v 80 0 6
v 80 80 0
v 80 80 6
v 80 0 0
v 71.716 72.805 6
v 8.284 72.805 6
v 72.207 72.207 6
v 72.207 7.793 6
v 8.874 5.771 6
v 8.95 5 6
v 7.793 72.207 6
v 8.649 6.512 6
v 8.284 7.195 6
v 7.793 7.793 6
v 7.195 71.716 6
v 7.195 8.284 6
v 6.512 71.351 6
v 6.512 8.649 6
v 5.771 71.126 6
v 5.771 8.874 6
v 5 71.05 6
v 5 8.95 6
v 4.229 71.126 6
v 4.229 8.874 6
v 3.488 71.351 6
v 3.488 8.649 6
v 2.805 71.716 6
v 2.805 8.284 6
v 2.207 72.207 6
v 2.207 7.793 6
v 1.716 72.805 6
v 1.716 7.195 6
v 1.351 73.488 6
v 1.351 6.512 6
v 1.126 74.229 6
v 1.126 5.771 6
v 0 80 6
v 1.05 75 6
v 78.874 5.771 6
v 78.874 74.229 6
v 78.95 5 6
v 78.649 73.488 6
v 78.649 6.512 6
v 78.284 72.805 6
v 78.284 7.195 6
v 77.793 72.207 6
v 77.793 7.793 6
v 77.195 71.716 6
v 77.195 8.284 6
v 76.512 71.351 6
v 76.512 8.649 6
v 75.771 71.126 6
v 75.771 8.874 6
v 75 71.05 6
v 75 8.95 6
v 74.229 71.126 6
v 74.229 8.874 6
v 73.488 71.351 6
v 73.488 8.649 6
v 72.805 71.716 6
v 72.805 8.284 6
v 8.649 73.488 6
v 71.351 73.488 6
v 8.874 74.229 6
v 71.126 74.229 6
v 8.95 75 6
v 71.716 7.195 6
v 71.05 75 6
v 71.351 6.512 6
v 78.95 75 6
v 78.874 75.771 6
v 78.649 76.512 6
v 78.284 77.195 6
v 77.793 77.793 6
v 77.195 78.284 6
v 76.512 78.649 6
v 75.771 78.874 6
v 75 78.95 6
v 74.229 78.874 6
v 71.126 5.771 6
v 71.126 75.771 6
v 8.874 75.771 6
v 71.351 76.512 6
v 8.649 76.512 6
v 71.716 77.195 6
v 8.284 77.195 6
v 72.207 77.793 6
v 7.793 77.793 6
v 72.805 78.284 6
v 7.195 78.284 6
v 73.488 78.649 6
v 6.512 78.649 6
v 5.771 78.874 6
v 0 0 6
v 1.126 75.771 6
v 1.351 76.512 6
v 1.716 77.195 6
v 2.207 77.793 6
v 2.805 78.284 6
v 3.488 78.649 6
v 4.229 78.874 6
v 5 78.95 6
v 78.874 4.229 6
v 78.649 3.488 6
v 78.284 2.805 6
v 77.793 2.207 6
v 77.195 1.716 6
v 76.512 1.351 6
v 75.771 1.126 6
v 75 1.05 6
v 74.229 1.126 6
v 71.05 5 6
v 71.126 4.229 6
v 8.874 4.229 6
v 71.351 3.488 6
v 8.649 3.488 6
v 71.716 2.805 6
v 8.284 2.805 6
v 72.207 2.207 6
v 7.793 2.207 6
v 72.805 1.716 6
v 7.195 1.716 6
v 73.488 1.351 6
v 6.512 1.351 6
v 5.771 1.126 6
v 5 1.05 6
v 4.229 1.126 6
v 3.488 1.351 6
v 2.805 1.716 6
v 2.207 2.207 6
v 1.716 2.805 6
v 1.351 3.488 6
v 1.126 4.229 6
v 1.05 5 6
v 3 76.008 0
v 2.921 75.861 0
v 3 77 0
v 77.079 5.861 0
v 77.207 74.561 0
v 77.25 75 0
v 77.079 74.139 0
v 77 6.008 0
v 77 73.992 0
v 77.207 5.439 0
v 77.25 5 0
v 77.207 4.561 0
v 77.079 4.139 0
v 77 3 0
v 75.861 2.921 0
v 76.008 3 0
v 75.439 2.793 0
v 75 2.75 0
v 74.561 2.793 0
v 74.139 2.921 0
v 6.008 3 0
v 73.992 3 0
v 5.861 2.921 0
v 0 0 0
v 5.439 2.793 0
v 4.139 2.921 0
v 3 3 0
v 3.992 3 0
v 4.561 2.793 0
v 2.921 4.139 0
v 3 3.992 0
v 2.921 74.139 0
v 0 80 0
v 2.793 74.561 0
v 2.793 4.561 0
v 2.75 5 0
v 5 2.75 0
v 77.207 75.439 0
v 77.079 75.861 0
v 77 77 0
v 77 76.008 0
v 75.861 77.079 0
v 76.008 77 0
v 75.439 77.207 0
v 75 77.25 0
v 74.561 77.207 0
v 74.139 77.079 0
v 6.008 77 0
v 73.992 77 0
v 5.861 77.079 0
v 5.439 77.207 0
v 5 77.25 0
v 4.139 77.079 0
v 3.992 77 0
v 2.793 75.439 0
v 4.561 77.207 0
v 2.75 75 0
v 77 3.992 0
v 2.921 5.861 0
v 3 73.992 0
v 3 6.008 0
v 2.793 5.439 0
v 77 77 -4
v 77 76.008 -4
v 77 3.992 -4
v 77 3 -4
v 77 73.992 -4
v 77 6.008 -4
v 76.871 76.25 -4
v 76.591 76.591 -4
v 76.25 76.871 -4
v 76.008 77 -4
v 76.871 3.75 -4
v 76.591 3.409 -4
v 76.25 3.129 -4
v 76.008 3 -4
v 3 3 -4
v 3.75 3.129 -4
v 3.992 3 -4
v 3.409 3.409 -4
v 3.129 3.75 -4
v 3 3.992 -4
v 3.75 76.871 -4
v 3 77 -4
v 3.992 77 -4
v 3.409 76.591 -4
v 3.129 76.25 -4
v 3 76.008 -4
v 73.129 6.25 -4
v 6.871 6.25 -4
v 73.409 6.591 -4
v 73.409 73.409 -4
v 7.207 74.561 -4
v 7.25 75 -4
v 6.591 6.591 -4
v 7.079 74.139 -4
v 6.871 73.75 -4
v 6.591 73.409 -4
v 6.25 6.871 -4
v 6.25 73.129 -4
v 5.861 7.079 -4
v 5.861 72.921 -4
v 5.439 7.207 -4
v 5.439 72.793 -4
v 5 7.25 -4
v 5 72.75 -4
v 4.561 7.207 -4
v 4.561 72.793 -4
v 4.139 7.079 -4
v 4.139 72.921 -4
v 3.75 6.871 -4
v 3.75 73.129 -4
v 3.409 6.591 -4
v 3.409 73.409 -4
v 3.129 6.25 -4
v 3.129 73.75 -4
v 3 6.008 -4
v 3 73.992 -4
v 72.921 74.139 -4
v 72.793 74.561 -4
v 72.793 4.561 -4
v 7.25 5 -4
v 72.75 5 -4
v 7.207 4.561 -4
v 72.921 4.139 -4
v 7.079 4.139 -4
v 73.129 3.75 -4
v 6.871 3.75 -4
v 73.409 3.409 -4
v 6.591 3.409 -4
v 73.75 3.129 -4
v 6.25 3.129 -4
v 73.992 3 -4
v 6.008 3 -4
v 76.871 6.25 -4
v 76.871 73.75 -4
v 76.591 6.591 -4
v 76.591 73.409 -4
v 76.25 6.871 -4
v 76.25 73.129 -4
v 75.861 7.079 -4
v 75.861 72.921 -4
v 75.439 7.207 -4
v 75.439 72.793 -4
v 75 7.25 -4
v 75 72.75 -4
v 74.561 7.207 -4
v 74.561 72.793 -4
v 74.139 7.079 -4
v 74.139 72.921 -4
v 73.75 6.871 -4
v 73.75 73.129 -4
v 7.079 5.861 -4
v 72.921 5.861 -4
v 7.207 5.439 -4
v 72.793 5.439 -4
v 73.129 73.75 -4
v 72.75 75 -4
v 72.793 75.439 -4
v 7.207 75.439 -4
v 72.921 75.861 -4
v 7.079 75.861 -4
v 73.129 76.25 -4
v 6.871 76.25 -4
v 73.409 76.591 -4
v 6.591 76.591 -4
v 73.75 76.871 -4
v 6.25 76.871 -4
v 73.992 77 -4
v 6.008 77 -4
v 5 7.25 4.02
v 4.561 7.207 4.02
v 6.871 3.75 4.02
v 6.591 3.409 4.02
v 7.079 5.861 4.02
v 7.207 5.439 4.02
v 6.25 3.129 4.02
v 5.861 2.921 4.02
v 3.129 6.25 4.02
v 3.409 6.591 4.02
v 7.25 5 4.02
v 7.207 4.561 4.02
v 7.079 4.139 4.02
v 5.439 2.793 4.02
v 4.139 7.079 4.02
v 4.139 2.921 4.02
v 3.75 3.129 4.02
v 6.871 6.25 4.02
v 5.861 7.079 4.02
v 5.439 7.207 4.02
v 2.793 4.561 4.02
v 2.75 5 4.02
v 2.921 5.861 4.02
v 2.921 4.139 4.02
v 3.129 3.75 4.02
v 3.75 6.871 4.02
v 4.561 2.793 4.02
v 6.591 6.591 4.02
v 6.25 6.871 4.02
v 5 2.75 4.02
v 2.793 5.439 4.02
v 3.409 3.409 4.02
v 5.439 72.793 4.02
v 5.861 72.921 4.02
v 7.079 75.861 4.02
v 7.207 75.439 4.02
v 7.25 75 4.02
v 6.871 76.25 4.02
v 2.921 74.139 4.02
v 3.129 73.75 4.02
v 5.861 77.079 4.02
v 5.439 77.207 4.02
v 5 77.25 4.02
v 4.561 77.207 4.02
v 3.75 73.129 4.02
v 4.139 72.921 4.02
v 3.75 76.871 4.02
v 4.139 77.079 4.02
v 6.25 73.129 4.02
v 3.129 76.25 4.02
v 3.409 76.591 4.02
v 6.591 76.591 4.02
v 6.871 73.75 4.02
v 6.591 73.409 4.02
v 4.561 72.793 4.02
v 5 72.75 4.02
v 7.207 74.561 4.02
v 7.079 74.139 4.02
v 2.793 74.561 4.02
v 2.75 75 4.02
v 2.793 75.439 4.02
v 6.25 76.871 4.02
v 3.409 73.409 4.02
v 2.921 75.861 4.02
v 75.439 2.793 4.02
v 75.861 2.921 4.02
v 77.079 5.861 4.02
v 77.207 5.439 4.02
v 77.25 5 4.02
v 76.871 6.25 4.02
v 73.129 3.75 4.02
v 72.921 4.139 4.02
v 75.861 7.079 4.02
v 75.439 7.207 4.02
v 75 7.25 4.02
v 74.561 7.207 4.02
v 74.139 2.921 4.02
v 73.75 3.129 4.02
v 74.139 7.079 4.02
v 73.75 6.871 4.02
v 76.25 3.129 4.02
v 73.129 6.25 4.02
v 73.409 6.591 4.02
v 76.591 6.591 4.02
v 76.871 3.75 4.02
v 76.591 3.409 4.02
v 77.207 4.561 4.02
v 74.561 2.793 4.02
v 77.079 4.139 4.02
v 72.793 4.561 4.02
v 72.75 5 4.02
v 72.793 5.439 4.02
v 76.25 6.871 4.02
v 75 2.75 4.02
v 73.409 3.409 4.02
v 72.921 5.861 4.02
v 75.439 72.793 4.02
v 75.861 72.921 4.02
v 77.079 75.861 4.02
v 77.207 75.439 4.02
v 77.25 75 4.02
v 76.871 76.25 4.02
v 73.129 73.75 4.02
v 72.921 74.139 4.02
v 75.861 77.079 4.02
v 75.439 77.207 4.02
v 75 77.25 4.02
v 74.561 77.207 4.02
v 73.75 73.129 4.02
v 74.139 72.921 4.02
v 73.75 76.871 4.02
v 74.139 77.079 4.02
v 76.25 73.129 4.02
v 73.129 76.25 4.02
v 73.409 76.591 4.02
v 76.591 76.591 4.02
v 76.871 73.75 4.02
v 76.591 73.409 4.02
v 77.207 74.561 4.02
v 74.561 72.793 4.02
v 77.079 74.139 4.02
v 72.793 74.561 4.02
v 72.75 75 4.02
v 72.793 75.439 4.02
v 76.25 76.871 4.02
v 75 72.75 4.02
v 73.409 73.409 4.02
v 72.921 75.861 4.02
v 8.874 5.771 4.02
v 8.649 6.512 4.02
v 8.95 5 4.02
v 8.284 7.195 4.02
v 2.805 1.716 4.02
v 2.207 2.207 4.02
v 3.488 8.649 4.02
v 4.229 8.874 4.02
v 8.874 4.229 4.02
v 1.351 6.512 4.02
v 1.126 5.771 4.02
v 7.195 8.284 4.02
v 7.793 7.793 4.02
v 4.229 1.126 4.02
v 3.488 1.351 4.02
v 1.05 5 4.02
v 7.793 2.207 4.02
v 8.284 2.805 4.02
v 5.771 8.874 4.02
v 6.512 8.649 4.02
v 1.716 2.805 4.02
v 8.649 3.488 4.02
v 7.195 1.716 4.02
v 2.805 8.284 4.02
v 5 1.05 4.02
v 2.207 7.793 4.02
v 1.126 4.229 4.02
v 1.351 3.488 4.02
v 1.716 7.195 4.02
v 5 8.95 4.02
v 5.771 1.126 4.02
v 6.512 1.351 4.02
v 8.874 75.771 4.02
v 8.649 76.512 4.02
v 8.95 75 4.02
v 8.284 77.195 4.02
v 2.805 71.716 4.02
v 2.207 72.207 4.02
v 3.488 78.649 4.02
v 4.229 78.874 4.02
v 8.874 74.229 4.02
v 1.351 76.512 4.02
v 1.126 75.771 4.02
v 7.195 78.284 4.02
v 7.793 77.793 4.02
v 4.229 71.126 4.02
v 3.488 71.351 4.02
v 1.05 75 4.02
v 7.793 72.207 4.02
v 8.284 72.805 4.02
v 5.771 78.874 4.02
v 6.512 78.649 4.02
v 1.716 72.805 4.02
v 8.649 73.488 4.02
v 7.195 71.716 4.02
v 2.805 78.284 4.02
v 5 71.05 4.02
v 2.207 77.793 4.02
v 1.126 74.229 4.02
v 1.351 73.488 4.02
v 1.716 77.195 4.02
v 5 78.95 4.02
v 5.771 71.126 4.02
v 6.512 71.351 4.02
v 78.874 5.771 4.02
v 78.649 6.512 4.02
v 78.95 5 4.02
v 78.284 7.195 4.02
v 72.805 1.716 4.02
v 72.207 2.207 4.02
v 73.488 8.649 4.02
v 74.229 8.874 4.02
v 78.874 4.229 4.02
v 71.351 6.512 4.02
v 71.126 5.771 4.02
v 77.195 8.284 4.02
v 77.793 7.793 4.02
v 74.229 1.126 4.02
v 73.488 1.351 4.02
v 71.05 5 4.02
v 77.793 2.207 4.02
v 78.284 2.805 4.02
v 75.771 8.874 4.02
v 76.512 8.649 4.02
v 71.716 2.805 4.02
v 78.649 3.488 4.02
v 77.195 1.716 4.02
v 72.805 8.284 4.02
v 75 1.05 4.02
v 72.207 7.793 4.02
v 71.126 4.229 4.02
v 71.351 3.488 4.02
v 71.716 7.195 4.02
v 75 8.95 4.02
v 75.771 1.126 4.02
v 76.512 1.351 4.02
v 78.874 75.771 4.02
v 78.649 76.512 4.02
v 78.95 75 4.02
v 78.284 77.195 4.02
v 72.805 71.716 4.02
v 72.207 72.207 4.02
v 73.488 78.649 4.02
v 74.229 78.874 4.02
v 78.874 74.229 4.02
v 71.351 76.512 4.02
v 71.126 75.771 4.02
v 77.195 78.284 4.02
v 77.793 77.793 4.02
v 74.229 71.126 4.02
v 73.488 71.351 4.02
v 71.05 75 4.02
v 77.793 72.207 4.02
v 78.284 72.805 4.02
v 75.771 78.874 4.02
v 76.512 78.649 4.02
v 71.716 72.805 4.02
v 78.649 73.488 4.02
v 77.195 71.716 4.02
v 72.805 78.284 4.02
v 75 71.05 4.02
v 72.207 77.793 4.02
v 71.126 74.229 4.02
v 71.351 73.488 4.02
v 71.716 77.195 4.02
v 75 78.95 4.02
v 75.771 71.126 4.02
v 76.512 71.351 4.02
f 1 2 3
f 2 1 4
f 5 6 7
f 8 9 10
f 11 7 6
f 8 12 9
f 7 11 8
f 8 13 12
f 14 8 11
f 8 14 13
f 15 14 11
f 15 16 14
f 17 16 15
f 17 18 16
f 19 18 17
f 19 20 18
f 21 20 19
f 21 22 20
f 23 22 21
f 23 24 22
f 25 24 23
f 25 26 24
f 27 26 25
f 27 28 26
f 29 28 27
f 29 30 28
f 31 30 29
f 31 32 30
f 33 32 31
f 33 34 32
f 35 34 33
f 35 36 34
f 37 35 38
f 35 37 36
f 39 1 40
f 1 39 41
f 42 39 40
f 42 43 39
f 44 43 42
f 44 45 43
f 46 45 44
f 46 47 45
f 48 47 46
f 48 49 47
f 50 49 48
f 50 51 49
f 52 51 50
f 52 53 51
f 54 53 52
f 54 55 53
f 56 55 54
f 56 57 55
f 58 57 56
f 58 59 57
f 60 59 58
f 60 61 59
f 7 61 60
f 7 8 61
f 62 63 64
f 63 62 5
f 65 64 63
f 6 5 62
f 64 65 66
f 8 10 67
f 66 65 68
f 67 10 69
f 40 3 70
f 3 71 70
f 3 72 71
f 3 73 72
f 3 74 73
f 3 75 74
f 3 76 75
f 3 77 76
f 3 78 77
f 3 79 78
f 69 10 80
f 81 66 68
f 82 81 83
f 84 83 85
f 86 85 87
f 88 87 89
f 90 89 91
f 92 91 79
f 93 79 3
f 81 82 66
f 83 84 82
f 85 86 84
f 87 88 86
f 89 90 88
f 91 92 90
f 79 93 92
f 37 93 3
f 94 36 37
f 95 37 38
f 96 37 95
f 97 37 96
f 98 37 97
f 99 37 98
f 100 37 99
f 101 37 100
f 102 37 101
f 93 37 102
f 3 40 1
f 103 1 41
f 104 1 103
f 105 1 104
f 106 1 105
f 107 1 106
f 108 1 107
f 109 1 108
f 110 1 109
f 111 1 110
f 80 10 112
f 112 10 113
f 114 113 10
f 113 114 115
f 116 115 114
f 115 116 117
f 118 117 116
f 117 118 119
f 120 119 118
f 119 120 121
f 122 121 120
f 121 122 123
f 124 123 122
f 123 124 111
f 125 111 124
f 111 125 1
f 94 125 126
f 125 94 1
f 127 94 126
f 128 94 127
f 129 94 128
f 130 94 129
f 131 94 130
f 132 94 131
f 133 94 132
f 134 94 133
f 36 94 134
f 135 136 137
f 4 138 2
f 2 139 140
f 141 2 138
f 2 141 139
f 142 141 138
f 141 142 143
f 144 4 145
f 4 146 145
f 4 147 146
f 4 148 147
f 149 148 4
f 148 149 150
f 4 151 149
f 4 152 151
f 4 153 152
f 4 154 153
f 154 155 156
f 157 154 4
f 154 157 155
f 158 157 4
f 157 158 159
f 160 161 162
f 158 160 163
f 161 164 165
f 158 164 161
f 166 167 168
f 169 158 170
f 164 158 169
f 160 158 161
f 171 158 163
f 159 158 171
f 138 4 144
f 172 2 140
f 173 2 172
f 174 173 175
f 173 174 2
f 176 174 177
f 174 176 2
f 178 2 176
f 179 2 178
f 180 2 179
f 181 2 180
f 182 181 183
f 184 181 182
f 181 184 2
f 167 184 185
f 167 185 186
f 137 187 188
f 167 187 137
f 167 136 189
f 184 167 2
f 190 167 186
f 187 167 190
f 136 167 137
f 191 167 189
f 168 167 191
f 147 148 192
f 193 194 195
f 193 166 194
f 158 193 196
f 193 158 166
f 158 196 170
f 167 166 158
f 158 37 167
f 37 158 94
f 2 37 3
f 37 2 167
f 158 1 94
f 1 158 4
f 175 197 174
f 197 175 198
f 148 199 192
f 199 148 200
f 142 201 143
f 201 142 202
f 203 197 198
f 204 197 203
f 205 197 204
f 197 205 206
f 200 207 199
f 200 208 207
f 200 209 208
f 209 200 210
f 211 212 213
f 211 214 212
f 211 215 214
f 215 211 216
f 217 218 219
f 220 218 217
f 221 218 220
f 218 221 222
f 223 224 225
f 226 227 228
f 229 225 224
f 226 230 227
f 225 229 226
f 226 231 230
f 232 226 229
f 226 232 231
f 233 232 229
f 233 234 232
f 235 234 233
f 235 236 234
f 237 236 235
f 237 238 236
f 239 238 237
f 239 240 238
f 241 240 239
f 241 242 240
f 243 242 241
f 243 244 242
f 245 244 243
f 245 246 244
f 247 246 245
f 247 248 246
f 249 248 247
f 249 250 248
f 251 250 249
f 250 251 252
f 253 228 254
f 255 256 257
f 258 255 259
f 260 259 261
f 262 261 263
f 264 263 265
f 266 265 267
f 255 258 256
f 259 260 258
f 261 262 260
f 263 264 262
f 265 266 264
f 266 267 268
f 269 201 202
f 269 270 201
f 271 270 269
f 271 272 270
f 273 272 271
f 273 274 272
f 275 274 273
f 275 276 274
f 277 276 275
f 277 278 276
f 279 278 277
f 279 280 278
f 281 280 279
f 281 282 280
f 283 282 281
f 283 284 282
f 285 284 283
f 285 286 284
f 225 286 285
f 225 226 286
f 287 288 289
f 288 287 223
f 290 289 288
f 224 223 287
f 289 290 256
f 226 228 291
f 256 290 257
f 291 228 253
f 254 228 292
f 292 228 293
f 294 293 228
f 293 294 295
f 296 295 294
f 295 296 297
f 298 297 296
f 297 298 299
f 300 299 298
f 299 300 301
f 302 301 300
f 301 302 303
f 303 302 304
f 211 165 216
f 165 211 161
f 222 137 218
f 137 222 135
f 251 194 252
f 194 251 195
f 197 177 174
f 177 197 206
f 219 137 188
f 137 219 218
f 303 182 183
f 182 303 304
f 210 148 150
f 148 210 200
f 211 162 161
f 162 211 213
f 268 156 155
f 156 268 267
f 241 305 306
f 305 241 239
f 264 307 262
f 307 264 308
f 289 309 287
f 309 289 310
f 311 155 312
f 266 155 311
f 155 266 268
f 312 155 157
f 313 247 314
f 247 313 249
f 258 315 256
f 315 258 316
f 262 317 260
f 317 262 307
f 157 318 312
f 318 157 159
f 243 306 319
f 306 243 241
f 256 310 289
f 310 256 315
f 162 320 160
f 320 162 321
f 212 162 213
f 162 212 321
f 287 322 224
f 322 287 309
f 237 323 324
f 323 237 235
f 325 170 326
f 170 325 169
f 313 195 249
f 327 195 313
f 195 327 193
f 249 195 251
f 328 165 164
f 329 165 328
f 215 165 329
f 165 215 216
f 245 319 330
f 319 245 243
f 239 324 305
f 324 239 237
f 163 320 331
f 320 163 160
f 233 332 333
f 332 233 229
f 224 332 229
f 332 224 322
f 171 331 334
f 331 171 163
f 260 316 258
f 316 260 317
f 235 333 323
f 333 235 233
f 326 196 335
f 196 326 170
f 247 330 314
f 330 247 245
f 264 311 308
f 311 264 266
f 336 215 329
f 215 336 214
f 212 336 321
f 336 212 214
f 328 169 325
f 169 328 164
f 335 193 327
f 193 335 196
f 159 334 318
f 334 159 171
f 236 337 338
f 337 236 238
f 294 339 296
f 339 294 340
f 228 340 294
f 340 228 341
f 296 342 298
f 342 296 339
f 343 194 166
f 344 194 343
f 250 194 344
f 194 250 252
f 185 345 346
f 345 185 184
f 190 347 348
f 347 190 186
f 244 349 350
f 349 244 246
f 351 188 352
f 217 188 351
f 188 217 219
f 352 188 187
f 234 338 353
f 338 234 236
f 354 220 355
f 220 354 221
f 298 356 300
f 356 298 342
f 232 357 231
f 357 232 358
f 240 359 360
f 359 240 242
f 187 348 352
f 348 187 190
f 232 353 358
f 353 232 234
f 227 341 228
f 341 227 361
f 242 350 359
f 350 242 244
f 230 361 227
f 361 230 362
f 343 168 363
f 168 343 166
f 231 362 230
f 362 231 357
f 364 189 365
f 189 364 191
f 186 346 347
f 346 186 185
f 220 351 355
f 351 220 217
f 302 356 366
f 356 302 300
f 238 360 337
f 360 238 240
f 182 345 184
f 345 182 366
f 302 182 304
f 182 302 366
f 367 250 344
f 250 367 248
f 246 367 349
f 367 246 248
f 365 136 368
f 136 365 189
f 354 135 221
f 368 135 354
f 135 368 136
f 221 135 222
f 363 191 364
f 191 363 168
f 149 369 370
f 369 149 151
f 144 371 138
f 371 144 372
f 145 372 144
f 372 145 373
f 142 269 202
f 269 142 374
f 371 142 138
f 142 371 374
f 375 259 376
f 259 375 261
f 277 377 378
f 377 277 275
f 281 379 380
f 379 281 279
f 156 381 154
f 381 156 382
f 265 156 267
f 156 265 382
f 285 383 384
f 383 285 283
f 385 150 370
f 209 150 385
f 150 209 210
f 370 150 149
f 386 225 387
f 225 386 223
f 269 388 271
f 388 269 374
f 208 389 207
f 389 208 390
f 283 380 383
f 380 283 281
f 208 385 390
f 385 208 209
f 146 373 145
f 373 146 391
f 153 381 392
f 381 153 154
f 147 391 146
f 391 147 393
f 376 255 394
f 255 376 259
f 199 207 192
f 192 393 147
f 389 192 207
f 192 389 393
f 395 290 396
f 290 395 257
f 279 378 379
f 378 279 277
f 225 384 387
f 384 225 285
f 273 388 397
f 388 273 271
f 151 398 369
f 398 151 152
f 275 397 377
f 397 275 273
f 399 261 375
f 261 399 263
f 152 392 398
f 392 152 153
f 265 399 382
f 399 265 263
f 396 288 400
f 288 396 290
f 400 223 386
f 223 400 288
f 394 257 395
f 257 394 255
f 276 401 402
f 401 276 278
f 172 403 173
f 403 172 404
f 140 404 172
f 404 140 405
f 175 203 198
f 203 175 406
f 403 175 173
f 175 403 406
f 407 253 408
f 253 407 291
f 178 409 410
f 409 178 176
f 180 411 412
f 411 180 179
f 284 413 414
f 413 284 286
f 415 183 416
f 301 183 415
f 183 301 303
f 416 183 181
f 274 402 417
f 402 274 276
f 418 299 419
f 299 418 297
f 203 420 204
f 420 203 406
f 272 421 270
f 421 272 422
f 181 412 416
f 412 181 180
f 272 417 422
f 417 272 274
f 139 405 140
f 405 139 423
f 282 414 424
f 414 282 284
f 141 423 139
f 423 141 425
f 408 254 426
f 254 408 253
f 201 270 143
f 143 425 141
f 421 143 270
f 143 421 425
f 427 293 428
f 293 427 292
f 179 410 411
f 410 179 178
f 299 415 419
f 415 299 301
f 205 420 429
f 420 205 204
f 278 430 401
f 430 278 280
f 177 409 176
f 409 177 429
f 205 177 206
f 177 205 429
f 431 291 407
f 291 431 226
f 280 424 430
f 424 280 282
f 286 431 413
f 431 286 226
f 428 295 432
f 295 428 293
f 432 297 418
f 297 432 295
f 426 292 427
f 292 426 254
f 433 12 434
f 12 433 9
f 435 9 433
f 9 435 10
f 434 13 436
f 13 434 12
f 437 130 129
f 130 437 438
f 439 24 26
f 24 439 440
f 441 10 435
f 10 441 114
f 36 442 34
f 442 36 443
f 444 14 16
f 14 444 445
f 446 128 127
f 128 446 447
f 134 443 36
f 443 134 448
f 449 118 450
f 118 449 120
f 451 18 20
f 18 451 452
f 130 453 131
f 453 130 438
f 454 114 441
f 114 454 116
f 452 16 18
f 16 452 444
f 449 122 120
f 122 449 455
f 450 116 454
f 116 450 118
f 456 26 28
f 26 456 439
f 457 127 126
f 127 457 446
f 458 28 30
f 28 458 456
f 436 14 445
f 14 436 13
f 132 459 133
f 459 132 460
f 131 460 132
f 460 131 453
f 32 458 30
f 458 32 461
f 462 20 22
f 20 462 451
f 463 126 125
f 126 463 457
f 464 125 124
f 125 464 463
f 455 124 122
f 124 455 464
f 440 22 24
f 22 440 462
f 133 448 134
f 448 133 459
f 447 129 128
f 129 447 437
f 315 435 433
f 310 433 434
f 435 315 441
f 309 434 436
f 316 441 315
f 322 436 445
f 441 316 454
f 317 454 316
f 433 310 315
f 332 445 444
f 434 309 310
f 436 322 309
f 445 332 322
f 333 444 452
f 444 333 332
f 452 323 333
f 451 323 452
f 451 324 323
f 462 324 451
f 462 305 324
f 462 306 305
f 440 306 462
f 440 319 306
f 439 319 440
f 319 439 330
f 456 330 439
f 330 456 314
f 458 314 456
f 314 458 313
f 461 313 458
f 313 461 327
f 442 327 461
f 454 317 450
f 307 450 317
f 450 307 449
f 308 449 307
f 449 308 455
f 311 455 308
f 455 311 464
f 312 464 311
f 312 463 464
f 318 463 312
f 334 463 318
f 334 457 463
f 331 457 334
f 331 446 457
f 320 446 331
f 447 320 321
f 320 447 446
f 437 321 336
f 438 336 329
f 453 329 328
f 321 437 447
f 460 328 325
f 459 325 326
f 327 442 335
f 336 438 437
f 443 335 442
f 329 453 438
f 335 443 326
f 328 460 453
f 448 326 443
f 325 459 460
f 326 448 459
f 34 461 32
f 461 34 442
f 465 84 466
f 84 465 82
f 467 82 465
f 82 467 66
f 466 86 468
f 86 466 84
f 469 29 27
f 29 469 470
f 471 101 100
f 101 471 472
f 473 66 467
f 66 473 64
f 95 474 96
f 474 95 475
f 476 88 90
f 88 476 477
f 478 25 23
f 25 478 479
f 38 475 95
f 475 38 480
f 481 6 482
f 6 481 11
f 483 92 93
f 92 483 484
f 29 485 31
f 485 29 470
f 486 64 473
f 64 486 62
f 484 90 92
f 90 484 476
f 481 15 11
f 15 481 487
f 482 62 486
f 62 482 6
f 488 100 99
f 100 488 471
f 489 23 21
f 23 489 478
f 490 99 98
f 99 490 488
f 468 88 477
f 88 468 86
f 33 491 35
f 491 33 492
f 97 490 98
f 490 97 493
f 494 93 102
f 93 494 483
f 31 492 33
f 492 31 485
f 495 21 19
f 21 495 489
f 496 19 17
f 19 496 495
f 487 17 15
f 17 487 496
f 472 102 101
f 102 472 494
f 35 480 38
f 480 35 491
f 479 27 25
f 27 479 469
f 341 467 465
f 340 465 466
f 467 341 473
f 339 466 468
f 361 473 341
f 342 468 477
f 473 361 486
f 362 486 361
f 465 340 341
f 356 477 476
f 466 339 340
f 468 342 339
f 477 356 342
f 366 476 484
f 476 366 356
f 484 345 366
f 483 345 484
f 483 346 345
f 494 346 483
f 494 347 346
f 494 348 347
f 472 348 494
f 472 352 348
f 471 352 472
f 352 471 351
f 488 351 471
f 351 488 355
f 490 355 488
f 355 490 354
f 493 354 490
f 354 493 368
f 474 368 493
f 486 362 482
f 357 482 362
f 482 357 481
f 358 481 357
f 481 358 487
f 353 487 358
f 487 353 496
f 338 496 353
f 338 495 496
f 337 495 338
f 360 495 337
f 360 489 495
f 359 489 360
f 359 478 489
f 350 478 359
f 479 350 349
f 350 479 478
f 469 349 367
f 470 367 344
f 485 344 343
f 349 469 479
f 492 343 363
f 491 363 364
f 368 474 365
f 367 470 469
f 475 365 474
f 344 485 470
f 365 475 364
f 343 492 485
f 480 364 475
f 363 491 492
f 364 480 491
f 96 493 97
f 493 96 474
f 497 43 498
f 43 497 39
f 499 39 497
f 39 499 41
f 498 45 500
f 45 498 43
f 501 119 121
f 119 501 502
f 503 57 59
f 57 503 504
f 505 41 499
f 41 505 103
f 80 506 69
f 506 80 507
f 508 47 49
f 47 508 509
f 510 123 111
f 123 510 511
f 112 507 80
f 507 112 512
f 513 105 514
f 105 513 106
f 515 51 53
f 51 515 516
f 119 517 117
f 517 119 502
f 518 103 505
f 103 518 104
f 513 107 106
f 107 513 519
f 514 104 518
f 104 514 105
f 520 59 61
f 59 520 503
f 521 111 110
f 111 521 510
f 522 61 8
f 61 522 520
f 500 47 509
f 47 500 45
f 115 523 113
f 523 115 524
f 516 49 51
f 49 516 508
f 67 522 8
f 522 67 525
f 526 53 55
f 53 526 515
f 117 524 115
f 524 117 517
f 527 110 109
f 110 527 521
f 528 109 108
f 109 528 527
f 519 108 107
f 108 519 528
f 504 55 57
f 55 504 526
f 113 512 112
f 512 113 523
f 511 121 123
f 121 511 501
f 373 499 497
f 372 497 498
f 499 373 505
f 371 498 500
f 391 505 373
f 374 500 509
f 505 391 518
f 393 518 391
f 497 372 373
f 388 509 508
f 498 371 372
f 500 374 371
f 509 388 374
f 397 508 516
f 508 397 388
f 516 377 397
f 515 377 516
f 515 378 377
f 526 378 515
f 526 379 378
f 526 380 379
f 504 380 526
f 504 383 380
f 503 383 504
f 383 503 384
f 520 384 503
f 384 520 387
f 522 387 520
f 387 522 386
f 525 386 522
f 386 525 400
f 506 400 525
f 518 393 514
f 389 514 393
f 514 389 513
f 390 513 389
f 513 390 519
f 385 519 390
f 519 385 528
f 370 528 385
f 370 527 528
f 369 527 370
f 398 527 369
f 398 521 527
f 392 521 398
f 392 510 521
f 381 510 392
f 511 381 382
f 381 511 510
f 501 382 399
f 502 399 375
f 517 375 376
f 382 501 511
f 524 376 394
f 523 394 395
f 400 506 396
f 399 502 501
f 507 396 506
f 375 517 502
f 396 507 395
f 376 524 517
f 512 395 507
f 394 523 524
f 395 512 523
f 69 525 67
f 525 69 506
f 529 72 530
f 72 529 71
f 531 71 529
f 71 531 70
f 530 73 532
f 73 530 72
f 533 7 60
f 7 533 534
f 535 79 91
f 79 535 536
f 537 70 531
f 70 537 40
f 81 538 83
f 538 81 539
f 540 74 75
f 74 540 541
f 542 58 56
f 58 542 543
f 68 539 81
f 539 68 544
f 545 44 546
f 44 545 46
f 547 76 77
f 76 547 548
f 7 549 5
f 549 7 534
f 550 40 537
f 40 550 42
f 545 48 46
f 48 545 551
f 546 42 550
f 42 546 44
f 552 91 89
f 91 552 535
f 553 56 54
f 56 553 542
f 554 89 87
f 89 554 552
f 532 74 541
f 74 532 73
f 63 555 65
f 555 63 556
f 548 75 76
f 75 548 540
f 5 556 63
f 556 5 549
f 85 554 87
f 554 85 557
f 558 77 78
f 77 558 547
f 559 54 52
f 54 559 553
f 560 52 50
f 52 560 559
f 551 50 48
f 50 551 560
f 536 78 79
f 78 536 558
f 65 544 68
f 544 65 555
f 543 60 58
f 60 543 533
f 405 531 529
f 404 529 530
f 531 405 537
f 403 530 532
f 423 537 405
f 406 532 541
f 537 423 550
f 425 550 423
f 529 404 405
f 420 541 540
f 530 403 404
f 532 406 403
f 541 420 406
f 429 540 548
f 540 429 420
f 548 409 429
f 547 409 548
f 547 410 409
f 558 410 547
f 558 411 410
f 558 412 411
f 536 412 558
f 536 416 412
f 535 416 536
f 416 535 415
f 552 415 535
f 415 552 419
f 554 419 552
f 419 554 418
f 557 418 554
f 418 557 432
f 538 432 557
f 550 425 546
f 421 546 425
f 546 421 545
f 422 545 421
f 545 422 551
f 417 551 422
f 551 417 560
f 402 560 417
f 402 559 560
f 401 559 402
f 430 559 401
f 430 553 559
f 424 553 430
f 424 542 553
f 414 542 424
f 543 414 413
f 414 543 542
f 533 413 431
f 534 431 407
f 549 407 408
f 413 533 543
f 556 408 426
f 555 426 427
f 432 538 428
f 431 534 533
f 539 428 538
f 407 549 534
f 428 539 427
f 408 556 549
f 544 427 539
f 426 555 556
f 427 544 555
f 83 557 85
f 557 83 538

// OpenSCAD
$fn = 32;

// ----------------------------------------------------------------------
// Enclosure lid: 80 x 80 x 6 mm, 4 bolt holes
// ----------------------------------------------------------------------

// --- parameters (mm) ---
length = 80;              // lid length, X
width = 80;               // lid width, Y
plate_t = 6;              // lid plate thickness
bolt_d = 4.5;             // bolt clearance
boss_lip = 5;             // bolt hole inset from the corner
sink = 1;                 // overlap of the lip and ribs into the plate
lip_h = 5;                // lip height below the plate
lip_wall = 3;             // lip wall thickness
cs_d = 7.9;               // countersink diameter
cs_h = 1.98;              // countersink depth

module plate() {
  cube([length, width, plate_t]);
  /* lip that drops into the housing opening, sunk into the plate */
  translate([lip_wall, lip_wall, -lip_h + sink]) cube([length - 2 * lip_wall, width - 2 * lip_wall, lip_h]);
}

difference() {
  plate();
  /* bolt pattern matching the corner bosses */
  for (sx = [0, 1]) for (sy = [0, 1])
    translate([sx * (length - 2 * boss_lip) + boss_lip, sy * (width - 2 * boss_lip) + boss_lip, -lip_h - 1])
      cylinder(h = plate_t + lip_h + 2, d = bolt_d);
  /* countersinks so the heads sit flush */
  for (sx = [0, 1]) for (sy = [0, 1])
    translate([sx * (length - 2 * boss_lip) + boss_lip, sy * (width - 2 * boss_lip) + boss_lip, plate_t - cs_h])
      cylinder(h = cs_h + 0.5, d = cs_d);
}
